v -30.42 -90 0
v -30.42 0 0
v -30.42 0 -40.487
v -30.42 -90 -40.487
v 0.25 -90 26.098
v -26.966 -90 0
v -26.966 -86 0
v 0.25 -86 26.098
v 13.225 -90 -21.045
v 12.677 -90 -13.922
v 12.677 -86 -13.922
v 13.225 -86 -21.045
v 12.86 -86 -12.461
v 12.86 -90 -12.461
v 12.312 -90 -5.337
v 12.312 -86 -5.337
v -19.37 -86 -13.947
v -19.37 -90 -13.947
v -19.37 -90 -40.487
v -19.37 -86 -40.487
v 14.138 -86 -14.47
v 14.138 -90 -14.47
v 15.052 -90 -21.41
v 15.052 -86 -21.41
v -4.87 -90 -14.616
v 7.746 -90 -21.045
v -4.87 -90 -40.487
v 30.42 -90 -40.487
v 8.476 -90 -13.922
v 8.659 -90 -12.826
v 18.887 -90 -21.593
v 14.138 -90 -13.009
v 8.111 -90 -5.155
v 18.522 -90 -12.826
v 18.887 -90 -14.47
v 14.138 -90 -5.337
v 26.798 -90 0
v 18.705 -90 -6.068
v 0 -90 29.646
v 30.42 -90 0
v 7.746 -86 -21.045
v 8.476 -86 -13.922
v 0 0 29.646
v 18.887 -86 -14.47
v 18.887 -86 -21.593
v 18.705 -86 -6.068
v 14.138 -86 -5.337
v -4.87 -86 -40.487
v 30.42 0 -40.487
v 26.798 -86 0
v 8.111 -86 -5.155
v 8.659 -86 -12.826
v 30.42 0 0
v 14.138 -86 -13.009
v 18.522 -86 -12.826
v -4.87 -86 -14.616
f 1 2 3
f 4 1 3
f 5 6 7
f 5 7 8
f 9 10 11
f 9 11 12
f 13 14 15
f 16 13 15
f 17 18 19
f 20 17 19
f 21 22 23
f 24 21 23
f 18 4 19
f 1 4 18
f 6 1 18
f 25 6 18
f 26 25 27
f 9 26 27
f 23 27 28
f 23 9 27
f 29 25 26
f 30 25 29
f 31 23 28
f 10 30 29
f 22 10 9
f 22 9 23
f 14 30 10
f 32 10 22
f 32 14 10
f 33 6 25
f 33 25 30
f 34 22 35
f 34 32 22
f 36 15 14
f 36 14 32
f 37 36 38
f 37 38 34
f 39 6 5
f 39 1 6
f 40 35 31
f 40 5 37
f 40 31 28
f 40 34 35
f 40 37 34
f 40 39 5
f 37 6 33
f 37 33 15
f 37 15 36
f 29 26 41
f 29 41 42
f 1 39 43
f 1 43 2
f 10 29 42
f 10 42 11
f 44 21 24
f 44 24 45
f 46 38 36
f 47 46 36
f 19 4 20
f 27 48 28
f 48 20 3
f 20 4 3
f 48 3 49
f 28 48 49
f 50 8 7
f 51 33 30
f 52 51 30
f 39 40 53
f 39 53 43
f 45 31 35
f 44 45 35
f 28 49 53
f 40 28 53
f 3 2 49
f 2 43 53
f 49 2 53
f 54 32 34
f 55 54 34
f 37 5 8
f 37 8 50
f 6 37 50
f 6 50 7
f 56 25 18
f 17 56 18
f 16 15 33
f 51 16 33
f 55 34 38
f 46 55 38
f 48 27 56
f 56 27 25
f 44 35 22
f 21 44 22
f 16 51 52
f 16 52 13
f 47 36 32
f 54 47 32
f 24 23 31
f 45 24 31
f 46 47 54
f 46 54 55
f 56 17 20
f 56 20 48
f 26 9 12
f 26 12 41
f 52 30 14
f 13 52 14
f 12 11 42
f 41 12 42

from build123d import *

# Parameters (mm, degrees)
PAD_DEPTH            = 90
POCKET_DEPTH         = 4
BODY_PLACEMENT_ANGLE = 90


with BuildPart() as part:
    # Sketch → Pad (new body)
    with BuildSketch(Plane.XY):
        Polygon((0, 29.646015), (-30.420355, 0), (-30.420355, -40.486725), (30.420351, -40.486725), (30.420351, 0), align=None)
    extrude(amount=PAD_DEPTH)

    # Sketch001 (on Face7 of Pad) → Pocket (cut)
    with BuildSketch(Plane.XY.offset(90)):
        Polygon((-19.370302, -13.946699), (-19.370302, -40.940281), (-4.869621, -40.940281), (-4.869621, -14.615959), align=None)
        Polygon((8.111094, -5.154654), (8.659041, -12.825894), (12.859957, -12.460593), (12.312009, -5.337305), align=None)
        Polygon((14.138495, -5.337304), (14.138495, -13.008539), (18.52206, -12.825896), (18.704708, -6.067894), align=None)
        Polygon((8.476391, -13.921784), (12.677306, -13.921784), (13.225254, -21.045074), (7.745796, -21.045074), align=None)
        Polygon((14.138495, -14.469728), (15.05174, -21.410372), (18.887358, -21.593025), (18.887358, -14.469728), align=None)
        Polygon((-26.966421, 0), (0.250248, 26.098402), (26.797653, 0), align=None)
    extrude(amount=-POCKET_DEPTH, mode=Mode.SUBTRACT)


with BuildPart() as part_1:
    # Body placement: moved
    add(part.part.rotate(Axis((0, 0, 0), (1, 0, 0)), BODY_PLACEMENT_ANGLE))


solid = part_1.part
